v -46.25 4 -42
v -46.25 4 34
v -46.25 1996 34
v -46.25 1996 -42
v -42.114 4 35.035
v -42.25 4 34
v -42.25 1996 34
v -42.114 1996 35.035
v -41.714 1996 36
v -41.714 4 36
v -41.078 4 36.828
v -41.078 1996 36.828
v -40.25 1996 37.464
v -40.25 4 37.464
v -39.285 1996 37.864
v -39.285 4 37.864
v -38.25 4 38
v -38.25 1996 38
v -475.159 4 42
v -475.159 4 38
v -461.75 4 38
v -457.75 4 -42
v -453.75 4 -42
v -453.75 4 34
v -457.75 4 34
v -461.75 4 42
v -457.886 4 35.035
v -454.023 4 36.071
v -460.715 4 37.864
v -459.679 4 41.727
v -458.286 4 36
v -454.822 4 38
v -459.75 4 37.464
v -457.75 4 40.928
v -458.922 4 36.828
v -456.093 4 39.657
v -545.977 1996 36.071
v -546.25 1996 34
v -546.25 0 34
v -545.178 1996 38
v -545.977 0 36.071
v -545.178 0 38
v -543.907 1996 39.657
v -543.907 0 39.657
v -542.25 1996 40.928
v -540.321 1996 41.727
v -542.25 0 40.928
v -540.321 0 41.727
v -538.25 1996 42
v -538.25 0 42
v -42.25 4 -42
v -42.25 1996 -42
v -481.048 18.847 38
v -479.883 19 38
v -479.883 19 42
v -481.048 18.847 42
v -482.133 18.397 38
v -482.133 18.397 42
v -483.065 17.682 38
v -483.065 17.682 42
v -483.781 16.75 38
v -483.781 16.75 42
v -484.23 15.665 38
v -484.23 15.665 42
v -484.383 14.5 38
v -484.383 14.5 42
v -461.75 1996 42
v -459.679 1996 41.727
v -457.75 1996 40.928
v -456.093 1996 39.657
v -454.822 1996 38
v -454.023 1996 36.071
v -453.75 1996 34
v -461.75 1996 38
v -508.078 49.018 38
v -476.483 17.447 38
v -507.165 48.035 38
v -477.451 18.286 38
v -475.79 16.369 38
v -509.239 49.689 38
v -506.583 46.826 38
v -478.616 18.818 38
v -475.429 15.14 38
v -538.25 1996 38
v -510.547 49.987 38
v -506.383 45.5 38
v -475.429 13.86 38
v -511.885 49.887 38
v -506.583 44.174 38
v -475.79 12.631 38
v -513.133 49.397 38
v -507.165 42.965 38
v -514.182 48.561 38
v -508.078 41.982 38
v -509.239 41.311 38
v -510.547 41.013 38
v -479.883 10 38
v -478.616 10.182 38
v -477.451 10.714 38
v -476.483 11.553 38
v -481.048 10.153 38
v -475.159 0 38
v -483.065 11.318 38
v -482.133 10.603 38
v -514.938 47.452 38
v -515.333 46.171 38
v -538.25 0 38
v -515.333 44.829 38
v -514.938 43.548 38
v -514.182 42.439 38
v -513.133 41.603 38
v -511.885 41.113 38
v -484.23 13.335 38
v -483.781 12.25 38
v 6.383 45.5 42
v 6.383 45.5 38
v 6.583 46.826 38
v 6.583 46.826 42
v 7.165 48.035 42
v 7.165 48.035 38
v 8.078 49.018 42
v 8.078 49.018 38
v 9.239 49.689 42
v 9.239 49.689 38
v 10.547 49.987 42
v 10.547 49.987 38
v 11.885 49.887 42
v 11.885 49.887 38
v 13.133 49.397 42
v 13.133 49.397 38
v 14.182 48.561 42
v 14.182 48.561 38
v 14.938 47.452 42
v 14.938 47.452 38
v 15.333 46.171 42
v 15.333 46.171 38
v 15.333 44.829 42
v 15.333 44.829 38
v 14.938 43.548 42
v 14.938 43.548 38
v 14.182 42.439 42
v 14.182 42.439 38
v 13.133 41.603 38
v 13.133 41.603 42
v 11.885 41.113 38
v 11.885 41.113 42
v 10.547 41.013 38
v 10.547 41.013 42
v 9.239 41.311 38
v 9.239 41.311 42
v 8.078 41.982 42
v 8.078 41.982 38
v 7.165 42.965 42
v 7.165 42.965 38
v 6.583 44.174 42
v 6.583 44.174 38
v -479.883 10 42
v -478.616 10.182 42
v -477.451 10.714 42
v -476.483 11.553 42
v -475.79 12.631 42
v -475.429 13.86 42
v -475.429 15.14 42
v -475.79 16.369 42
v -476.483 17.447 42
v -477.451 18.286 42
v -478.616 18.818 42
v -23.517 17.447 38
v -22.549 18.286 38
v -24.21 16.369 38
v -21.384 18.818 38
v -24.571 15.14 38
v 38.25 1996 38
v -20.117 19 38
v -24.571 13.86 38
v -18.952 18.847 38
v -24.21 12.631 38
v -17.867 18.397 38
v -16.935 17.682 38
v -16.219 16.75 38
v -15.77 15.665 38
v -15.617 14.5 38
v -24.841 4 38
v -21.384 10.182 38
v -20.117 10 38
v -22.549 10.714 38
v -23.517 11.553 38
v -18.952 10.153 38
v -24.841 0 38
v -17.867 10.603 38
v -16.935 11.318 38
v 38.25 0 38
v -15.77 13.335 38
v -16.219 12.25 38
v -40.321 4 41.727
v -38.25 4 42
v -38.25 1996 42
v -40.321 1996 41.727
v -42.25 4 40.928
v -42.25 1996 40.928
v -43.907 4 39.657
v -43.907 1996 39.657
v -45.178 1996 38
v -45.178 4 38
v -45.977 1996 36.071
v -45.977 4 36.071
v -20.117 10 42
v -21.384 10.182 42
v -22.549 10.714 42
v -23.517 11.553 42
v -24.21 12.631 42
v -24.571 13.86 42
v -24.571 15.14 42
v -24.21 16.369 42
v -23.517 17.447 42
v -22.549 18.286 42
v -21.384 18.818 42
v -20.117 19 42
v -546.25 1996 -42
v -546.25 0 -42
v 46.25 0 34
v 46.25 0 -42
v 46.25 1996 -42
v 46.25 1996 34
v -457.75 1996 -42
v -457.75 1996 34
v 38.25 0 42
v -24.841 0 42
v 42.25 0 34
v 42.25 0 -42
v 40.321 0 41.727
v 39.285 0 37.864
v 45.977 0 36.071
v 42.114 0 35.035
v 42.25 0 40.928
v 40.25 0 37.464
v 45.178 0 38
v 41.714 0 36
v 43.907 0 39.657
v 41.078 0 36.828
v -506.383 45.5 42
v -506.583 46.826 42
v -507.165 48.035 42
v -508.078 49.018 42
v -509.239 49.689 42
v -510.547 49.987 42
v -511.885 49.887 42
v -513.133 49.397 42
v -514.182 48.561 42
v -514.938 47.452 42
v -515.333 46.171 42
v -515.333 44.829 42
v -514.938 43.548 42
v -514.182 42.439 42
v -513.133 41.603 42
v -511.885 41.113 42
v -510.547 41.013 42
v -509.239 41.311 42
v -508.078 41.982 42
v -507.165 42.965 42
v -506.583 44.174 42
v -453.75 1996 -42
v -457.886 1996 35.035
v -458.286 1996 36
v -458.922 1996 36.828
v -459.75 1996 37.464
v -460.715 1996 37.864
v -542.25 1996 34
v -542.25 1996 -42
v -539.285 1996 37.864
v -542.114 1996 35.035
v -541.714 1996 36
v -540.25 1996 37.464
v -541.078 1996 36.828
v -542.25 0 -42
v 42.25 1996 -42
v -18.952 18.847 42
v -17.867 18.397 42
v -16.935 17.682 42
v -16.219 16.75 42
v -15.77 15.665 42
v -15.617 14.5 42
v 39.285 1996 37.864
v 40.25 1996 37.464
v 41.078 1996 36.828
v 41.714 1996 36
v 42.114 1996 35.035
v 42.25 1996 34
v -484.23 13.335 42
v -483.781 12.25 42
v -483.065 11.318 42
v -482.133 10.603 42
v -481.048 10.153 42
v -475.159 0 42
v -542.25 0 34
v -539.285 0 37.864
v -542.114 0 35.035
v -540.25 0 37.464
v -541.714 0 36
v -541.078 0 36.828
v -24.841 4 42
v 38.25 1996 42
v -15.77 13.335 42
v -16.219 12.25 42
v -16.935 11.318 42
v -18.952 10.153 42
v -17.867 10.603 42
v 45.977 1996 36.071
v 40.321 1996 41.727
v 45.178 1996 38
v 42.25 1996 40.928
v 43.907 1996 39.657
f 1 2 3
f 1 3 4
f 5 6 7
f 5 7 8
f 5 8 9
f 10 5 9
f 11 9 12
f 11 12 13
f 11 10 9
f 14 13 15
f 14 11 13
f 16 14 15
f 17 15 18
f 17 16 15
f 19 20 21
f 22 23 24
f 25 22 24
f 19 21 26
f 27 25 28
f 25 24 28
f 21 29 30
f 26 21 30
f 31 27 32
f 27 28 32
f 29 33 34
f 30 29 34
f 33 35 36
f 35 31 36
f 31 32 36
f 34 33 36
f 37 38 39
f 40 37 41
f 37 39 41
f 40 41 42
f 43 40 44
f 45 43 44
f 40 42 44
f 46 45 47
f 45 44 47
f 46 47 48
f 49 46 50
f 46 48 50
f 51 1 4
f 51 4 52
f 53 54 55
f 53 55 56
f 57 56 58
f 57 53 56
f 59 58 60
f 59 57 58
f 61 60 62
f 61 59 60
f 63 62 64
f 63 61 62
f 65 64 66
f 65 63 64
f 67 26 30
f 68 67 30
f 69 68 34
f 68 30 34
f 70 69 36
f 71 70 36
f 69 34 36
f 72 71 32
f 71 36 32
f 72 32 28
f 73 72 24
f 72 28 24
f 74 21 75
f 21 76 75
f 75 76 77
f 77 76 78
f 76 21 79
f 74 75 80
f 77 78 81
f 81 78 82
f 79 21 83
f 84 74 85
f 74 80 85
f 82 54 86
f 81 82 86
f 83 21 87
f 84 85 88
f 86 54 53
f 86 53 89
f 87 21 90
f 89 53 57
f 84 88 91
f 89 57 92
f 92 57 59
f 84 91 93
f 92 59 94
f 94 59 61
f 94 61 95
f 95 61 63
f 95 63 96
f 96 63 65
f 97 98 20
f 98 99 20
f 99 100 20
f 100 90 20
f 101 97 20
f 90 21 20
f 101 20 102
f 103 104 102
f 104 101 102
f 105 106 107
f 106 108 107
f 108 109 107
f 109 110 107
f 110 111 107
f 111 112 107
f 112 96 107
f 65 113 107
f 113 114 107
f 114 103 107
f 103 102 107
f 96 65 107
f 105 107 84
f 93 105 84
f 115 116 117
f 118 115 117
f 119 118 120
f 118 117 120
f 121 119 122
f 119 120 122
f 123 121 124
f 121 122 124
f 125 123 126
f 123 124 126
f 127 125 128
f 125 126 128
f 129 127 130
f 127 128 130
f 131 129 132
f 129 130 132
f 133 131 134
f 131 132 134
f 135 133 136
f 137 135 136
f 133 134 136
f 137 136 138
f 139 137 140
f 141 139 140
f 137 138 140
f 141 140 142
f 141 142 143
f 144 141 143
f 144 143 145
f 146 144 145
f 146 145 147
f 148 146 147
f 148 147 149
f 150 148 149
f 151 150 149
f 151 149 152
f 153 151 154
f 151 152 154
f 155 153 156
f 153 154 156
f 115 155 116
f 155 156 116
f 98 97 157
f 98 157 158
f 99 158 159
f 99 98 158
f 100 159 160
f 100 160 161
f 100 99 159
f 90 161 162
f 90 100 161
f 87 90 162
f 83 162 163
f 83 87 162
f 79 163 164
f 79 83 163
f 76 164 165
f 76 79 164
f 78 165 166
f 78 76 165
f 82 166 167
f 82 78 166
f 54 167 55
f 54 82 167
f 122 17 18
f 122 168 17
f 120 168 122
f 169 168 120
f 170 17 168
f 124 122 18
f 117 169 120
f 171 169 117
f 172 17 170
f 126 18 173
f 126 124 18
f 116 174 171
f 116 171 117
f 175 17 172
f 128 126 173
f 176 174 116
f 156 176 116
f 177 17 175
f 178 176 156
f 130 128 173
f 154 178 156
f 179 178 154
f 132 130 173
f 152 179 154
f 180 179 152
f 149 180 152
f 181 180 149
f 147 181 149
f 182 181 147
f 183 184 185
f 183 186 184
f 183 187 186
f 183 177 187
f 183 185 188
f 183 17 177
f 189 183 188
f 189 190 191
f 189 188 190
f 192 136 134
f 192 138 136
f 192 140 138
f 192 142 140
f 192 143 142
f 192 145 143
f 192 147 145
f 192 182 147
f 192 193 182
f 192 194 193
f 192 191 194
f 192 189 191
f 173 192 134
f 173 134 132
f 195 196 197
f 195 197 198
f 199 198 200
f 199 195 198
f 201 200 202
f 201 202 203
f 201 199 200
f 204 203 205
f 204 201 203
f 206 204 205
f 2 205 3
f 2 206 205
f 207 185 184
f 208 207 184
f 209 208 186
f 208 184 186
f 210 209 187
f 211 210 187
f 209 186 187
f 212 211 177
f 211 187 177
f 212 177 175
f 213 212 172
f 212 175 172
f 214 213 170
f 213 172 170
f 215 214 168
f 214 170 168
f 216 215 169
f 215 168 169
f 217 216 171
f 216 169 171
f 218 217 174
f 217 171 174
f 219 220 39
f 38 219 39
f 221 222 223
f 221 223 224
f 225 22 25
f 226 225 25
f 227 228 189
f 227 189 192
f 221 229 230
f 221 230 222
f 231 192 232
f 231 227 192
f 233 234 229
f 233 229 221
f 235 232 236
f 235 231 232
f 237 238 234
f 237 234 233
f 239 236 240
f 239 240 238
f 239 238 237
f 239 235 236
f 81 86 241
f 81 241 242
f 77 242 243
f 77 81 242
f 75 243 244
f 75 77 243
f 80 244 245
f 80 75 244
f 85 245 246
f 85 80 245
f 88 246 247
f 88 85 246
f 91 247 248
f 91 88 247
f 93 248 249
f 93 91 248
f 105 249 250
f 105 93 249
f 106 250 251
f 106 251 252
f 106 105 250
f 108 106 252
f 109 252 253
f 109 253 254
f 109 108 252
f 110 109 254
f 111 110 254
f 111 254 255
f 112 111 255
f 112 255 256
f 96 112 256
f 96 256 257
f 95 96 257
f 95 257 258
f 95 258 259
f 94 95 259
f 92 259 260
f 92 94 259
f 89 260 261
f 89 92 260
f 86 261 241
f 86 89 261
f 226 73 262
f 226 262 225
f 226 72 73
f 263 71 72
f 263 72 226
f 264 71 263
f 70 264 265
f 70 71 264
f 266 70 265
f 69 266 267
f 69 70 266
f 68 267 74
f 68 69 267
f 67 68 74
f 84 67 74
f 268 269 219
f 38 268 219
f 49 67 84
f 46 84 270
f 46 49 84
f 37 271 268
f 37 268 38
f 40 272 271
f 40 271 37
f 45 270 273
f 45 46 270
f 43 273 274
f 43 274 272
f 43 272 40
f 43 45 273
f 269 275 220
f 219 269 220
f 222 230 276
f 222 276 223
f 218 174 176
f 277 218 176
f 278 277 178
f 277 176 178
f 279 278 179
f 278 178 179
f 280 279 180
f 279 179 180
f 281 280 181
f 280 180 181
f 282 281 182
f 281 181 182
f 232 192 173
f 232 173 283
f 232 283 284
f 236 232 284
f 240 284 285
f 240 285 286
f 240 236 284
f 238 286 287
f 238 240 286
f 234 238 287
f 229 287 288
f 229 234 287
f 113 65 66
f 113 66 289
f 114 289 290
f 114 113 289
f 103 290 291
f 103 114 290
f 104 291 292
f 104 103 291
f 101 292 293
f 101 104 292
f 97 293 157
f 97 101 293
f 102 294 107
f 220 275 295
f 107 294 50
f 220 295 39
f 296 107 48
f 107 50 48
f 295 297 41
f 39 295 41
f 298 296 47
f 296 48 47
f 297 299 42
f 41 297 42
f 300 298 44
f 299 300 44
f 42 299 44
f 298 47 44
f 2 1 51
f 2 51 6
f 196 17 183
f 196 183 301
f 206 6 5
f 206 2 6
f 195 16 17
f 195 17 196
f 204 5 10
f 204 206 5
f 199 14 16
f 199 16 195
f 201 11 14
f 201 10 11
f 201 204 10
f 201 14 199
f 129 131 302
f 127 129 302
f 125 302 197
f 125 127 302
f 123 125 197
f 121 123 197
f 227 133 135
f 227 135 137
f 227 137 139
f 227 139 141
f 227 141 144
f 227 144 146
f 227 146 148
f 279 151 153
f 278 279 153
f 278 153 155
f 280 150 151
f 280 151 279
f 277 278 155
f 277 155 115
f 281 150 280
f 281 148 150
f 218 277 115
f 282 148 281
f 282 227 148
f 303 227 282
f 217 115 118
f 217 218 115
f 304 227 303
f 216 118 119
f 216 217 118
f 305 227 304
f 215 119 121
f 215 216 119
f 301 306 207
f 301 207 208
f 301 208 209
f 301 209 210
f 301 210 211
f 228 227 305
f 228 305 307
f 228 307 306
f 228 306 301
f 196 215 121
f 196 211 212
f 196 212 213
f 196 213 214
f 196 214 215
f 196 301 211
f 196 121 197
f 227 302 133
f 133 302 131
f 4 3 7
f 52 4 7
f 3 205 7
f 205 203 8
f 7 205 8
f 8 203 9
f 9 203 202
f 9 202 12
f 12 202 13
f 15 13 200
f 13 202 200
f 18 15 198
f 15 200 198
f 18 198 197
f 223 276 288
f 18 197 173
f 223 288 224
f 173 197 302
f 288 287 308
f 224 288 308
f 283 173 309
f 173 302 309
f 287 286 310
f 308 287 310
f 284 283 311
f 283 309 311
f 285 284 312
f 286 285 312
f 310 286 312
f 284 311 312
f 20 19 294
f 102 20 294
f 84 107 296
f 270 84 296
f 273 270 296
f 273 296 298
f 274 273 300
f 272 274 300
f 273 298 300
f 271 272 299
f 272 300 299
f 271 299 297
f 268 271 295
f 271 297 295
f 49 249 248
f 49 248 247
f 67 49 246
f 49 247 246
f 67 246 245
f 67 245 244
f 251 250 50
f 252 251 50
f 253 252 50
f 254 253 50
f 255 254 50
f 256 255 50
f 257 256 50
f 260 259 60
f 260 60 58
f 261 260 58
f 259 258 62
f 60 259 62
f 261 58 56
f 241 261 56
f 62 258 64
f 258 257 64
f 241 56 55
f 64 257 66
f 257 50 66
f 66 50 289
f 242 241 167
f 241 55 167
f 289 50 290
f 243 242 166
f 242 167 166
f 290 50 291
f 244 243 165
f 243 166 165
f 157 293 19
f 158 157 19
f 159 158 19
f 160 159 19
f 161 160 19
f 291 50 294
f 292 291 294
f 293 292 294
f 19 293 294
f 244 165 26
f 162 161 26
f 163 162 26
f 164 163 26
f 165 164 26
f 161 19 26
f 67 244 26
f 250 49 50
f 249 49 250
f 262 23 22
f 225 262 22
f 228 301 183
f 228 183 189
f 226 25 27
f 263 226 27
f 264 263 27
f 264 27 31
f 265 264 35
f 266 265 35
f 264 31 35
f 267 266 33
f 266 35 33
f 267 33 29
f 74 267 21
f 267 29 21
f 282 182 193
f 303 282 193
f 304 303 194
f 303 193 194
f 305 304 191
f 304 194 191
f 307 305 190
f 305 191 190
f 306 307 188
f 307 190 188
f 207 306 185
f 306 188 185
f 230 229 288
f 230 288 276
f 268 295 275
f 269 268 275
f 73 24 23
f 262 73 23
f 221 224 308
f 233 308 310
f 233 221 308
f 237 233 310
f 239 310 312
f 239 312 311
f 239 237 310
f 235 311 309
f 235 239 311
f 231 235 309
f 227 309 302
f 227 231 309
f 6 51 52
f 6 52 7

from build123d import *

# Parameters (mm, degrees)
F1_DEPTH = 1996
F3_W     = 4
F3_H     = 87
F4_DEPTH = 21.409
F6_DEPTH = 4


with BuildPart() as f1:
    # F0 (on Front) → F1 (new body)
    with BuildSketch(Plane.XZ):
        with BuildLine():
            Line((-46.25, 34), (-46.25, -42))
            Line((-46.25, -42), (-42.25, -42))
            Line((-42.25, -42), (-42.25, 34))
            ThreePointArc((-42.25, 34), (-41.078427, 36.828427), (-38.25, 38))
            Line((-38.25, 38), (38.25, 38))
            ThreePointArc((38.25, 38), (41.078427, 36.828427), (42.25, 34))
            Line((42.25, 34), (42.25, -42))
            Line((42.25, -42), (46.25, -42))
            Line((46.25, -42), (46.25, 34))
            ThreePointArc((46.25, 34), (43.906854, 39.656854), (38.25, 42))
            Line((38.25, 42), (-38.25, 42))
            ThreePointArc((-38.25, 42), (-43.906854, 39.656854), (-46.25, 34))
        make_face()
    extrude(amount=-F1_DEPTH)

    # F3 (on face) → F4 (cut)
    with BuildSketch(Plane(origin=(-46.25, 0, 0), x_dir=(0, -1, 0), z_dir=(-1, 0, 0))):
        with Locations((-2, 0.370724)):
            Rectangle(F3_W, F3_H)
    extrude(amount=-F4_DEPTH, mode=Mode.SUBTRACT)

    # F5 (on face) → F6 (cut)
    with BuildSketch(Plane(origin=(0, 0, 38), x_dir=(1, 0, 0), z_dir=(0, 0, -1))):
        with BuildLine():
            ThreePointArc((15.383453, -45.5), (10.883453, -41), (6.383453, -45.5))
            ThreePointArc((6.383453, -45.5), (10.883453, -50), (15.383453, -45.5))
        make_face()
        with BuildLine():
            Line((-20.116547, -14.5), (-20.116547, -10))
            ThreePointArc((-20.116547, -10), (-24.616547, -14.5), (-20.116547, -19))
            Line((-20.116547, -19), (-20.116547, -14.5))
        make_face()
        with BuildLine():
            ThreePointArc((-15.616547, -14.5), (-16.934566, -11.318019), (-20.116547, -10))
            Line((-20.116547, -10), (-20.116547, -14.5))
            Line((-20.116547, -14.5), (-20.116547, -19))
            ThreePointArc((-20.116547, -19), (-16.934566, -17.681981), (-15.616547, -14.5))
        make_face()
    extrude(amount=-F6_DEPTH, mode=Mode.SUBTRACT)


with BuildPart() as f8_1:
    # F8: instance of F1
    add(f1.part.mirror(Plane.YZ.offset(-250)))


solid = Compound([f1.part, f8_1.part])
